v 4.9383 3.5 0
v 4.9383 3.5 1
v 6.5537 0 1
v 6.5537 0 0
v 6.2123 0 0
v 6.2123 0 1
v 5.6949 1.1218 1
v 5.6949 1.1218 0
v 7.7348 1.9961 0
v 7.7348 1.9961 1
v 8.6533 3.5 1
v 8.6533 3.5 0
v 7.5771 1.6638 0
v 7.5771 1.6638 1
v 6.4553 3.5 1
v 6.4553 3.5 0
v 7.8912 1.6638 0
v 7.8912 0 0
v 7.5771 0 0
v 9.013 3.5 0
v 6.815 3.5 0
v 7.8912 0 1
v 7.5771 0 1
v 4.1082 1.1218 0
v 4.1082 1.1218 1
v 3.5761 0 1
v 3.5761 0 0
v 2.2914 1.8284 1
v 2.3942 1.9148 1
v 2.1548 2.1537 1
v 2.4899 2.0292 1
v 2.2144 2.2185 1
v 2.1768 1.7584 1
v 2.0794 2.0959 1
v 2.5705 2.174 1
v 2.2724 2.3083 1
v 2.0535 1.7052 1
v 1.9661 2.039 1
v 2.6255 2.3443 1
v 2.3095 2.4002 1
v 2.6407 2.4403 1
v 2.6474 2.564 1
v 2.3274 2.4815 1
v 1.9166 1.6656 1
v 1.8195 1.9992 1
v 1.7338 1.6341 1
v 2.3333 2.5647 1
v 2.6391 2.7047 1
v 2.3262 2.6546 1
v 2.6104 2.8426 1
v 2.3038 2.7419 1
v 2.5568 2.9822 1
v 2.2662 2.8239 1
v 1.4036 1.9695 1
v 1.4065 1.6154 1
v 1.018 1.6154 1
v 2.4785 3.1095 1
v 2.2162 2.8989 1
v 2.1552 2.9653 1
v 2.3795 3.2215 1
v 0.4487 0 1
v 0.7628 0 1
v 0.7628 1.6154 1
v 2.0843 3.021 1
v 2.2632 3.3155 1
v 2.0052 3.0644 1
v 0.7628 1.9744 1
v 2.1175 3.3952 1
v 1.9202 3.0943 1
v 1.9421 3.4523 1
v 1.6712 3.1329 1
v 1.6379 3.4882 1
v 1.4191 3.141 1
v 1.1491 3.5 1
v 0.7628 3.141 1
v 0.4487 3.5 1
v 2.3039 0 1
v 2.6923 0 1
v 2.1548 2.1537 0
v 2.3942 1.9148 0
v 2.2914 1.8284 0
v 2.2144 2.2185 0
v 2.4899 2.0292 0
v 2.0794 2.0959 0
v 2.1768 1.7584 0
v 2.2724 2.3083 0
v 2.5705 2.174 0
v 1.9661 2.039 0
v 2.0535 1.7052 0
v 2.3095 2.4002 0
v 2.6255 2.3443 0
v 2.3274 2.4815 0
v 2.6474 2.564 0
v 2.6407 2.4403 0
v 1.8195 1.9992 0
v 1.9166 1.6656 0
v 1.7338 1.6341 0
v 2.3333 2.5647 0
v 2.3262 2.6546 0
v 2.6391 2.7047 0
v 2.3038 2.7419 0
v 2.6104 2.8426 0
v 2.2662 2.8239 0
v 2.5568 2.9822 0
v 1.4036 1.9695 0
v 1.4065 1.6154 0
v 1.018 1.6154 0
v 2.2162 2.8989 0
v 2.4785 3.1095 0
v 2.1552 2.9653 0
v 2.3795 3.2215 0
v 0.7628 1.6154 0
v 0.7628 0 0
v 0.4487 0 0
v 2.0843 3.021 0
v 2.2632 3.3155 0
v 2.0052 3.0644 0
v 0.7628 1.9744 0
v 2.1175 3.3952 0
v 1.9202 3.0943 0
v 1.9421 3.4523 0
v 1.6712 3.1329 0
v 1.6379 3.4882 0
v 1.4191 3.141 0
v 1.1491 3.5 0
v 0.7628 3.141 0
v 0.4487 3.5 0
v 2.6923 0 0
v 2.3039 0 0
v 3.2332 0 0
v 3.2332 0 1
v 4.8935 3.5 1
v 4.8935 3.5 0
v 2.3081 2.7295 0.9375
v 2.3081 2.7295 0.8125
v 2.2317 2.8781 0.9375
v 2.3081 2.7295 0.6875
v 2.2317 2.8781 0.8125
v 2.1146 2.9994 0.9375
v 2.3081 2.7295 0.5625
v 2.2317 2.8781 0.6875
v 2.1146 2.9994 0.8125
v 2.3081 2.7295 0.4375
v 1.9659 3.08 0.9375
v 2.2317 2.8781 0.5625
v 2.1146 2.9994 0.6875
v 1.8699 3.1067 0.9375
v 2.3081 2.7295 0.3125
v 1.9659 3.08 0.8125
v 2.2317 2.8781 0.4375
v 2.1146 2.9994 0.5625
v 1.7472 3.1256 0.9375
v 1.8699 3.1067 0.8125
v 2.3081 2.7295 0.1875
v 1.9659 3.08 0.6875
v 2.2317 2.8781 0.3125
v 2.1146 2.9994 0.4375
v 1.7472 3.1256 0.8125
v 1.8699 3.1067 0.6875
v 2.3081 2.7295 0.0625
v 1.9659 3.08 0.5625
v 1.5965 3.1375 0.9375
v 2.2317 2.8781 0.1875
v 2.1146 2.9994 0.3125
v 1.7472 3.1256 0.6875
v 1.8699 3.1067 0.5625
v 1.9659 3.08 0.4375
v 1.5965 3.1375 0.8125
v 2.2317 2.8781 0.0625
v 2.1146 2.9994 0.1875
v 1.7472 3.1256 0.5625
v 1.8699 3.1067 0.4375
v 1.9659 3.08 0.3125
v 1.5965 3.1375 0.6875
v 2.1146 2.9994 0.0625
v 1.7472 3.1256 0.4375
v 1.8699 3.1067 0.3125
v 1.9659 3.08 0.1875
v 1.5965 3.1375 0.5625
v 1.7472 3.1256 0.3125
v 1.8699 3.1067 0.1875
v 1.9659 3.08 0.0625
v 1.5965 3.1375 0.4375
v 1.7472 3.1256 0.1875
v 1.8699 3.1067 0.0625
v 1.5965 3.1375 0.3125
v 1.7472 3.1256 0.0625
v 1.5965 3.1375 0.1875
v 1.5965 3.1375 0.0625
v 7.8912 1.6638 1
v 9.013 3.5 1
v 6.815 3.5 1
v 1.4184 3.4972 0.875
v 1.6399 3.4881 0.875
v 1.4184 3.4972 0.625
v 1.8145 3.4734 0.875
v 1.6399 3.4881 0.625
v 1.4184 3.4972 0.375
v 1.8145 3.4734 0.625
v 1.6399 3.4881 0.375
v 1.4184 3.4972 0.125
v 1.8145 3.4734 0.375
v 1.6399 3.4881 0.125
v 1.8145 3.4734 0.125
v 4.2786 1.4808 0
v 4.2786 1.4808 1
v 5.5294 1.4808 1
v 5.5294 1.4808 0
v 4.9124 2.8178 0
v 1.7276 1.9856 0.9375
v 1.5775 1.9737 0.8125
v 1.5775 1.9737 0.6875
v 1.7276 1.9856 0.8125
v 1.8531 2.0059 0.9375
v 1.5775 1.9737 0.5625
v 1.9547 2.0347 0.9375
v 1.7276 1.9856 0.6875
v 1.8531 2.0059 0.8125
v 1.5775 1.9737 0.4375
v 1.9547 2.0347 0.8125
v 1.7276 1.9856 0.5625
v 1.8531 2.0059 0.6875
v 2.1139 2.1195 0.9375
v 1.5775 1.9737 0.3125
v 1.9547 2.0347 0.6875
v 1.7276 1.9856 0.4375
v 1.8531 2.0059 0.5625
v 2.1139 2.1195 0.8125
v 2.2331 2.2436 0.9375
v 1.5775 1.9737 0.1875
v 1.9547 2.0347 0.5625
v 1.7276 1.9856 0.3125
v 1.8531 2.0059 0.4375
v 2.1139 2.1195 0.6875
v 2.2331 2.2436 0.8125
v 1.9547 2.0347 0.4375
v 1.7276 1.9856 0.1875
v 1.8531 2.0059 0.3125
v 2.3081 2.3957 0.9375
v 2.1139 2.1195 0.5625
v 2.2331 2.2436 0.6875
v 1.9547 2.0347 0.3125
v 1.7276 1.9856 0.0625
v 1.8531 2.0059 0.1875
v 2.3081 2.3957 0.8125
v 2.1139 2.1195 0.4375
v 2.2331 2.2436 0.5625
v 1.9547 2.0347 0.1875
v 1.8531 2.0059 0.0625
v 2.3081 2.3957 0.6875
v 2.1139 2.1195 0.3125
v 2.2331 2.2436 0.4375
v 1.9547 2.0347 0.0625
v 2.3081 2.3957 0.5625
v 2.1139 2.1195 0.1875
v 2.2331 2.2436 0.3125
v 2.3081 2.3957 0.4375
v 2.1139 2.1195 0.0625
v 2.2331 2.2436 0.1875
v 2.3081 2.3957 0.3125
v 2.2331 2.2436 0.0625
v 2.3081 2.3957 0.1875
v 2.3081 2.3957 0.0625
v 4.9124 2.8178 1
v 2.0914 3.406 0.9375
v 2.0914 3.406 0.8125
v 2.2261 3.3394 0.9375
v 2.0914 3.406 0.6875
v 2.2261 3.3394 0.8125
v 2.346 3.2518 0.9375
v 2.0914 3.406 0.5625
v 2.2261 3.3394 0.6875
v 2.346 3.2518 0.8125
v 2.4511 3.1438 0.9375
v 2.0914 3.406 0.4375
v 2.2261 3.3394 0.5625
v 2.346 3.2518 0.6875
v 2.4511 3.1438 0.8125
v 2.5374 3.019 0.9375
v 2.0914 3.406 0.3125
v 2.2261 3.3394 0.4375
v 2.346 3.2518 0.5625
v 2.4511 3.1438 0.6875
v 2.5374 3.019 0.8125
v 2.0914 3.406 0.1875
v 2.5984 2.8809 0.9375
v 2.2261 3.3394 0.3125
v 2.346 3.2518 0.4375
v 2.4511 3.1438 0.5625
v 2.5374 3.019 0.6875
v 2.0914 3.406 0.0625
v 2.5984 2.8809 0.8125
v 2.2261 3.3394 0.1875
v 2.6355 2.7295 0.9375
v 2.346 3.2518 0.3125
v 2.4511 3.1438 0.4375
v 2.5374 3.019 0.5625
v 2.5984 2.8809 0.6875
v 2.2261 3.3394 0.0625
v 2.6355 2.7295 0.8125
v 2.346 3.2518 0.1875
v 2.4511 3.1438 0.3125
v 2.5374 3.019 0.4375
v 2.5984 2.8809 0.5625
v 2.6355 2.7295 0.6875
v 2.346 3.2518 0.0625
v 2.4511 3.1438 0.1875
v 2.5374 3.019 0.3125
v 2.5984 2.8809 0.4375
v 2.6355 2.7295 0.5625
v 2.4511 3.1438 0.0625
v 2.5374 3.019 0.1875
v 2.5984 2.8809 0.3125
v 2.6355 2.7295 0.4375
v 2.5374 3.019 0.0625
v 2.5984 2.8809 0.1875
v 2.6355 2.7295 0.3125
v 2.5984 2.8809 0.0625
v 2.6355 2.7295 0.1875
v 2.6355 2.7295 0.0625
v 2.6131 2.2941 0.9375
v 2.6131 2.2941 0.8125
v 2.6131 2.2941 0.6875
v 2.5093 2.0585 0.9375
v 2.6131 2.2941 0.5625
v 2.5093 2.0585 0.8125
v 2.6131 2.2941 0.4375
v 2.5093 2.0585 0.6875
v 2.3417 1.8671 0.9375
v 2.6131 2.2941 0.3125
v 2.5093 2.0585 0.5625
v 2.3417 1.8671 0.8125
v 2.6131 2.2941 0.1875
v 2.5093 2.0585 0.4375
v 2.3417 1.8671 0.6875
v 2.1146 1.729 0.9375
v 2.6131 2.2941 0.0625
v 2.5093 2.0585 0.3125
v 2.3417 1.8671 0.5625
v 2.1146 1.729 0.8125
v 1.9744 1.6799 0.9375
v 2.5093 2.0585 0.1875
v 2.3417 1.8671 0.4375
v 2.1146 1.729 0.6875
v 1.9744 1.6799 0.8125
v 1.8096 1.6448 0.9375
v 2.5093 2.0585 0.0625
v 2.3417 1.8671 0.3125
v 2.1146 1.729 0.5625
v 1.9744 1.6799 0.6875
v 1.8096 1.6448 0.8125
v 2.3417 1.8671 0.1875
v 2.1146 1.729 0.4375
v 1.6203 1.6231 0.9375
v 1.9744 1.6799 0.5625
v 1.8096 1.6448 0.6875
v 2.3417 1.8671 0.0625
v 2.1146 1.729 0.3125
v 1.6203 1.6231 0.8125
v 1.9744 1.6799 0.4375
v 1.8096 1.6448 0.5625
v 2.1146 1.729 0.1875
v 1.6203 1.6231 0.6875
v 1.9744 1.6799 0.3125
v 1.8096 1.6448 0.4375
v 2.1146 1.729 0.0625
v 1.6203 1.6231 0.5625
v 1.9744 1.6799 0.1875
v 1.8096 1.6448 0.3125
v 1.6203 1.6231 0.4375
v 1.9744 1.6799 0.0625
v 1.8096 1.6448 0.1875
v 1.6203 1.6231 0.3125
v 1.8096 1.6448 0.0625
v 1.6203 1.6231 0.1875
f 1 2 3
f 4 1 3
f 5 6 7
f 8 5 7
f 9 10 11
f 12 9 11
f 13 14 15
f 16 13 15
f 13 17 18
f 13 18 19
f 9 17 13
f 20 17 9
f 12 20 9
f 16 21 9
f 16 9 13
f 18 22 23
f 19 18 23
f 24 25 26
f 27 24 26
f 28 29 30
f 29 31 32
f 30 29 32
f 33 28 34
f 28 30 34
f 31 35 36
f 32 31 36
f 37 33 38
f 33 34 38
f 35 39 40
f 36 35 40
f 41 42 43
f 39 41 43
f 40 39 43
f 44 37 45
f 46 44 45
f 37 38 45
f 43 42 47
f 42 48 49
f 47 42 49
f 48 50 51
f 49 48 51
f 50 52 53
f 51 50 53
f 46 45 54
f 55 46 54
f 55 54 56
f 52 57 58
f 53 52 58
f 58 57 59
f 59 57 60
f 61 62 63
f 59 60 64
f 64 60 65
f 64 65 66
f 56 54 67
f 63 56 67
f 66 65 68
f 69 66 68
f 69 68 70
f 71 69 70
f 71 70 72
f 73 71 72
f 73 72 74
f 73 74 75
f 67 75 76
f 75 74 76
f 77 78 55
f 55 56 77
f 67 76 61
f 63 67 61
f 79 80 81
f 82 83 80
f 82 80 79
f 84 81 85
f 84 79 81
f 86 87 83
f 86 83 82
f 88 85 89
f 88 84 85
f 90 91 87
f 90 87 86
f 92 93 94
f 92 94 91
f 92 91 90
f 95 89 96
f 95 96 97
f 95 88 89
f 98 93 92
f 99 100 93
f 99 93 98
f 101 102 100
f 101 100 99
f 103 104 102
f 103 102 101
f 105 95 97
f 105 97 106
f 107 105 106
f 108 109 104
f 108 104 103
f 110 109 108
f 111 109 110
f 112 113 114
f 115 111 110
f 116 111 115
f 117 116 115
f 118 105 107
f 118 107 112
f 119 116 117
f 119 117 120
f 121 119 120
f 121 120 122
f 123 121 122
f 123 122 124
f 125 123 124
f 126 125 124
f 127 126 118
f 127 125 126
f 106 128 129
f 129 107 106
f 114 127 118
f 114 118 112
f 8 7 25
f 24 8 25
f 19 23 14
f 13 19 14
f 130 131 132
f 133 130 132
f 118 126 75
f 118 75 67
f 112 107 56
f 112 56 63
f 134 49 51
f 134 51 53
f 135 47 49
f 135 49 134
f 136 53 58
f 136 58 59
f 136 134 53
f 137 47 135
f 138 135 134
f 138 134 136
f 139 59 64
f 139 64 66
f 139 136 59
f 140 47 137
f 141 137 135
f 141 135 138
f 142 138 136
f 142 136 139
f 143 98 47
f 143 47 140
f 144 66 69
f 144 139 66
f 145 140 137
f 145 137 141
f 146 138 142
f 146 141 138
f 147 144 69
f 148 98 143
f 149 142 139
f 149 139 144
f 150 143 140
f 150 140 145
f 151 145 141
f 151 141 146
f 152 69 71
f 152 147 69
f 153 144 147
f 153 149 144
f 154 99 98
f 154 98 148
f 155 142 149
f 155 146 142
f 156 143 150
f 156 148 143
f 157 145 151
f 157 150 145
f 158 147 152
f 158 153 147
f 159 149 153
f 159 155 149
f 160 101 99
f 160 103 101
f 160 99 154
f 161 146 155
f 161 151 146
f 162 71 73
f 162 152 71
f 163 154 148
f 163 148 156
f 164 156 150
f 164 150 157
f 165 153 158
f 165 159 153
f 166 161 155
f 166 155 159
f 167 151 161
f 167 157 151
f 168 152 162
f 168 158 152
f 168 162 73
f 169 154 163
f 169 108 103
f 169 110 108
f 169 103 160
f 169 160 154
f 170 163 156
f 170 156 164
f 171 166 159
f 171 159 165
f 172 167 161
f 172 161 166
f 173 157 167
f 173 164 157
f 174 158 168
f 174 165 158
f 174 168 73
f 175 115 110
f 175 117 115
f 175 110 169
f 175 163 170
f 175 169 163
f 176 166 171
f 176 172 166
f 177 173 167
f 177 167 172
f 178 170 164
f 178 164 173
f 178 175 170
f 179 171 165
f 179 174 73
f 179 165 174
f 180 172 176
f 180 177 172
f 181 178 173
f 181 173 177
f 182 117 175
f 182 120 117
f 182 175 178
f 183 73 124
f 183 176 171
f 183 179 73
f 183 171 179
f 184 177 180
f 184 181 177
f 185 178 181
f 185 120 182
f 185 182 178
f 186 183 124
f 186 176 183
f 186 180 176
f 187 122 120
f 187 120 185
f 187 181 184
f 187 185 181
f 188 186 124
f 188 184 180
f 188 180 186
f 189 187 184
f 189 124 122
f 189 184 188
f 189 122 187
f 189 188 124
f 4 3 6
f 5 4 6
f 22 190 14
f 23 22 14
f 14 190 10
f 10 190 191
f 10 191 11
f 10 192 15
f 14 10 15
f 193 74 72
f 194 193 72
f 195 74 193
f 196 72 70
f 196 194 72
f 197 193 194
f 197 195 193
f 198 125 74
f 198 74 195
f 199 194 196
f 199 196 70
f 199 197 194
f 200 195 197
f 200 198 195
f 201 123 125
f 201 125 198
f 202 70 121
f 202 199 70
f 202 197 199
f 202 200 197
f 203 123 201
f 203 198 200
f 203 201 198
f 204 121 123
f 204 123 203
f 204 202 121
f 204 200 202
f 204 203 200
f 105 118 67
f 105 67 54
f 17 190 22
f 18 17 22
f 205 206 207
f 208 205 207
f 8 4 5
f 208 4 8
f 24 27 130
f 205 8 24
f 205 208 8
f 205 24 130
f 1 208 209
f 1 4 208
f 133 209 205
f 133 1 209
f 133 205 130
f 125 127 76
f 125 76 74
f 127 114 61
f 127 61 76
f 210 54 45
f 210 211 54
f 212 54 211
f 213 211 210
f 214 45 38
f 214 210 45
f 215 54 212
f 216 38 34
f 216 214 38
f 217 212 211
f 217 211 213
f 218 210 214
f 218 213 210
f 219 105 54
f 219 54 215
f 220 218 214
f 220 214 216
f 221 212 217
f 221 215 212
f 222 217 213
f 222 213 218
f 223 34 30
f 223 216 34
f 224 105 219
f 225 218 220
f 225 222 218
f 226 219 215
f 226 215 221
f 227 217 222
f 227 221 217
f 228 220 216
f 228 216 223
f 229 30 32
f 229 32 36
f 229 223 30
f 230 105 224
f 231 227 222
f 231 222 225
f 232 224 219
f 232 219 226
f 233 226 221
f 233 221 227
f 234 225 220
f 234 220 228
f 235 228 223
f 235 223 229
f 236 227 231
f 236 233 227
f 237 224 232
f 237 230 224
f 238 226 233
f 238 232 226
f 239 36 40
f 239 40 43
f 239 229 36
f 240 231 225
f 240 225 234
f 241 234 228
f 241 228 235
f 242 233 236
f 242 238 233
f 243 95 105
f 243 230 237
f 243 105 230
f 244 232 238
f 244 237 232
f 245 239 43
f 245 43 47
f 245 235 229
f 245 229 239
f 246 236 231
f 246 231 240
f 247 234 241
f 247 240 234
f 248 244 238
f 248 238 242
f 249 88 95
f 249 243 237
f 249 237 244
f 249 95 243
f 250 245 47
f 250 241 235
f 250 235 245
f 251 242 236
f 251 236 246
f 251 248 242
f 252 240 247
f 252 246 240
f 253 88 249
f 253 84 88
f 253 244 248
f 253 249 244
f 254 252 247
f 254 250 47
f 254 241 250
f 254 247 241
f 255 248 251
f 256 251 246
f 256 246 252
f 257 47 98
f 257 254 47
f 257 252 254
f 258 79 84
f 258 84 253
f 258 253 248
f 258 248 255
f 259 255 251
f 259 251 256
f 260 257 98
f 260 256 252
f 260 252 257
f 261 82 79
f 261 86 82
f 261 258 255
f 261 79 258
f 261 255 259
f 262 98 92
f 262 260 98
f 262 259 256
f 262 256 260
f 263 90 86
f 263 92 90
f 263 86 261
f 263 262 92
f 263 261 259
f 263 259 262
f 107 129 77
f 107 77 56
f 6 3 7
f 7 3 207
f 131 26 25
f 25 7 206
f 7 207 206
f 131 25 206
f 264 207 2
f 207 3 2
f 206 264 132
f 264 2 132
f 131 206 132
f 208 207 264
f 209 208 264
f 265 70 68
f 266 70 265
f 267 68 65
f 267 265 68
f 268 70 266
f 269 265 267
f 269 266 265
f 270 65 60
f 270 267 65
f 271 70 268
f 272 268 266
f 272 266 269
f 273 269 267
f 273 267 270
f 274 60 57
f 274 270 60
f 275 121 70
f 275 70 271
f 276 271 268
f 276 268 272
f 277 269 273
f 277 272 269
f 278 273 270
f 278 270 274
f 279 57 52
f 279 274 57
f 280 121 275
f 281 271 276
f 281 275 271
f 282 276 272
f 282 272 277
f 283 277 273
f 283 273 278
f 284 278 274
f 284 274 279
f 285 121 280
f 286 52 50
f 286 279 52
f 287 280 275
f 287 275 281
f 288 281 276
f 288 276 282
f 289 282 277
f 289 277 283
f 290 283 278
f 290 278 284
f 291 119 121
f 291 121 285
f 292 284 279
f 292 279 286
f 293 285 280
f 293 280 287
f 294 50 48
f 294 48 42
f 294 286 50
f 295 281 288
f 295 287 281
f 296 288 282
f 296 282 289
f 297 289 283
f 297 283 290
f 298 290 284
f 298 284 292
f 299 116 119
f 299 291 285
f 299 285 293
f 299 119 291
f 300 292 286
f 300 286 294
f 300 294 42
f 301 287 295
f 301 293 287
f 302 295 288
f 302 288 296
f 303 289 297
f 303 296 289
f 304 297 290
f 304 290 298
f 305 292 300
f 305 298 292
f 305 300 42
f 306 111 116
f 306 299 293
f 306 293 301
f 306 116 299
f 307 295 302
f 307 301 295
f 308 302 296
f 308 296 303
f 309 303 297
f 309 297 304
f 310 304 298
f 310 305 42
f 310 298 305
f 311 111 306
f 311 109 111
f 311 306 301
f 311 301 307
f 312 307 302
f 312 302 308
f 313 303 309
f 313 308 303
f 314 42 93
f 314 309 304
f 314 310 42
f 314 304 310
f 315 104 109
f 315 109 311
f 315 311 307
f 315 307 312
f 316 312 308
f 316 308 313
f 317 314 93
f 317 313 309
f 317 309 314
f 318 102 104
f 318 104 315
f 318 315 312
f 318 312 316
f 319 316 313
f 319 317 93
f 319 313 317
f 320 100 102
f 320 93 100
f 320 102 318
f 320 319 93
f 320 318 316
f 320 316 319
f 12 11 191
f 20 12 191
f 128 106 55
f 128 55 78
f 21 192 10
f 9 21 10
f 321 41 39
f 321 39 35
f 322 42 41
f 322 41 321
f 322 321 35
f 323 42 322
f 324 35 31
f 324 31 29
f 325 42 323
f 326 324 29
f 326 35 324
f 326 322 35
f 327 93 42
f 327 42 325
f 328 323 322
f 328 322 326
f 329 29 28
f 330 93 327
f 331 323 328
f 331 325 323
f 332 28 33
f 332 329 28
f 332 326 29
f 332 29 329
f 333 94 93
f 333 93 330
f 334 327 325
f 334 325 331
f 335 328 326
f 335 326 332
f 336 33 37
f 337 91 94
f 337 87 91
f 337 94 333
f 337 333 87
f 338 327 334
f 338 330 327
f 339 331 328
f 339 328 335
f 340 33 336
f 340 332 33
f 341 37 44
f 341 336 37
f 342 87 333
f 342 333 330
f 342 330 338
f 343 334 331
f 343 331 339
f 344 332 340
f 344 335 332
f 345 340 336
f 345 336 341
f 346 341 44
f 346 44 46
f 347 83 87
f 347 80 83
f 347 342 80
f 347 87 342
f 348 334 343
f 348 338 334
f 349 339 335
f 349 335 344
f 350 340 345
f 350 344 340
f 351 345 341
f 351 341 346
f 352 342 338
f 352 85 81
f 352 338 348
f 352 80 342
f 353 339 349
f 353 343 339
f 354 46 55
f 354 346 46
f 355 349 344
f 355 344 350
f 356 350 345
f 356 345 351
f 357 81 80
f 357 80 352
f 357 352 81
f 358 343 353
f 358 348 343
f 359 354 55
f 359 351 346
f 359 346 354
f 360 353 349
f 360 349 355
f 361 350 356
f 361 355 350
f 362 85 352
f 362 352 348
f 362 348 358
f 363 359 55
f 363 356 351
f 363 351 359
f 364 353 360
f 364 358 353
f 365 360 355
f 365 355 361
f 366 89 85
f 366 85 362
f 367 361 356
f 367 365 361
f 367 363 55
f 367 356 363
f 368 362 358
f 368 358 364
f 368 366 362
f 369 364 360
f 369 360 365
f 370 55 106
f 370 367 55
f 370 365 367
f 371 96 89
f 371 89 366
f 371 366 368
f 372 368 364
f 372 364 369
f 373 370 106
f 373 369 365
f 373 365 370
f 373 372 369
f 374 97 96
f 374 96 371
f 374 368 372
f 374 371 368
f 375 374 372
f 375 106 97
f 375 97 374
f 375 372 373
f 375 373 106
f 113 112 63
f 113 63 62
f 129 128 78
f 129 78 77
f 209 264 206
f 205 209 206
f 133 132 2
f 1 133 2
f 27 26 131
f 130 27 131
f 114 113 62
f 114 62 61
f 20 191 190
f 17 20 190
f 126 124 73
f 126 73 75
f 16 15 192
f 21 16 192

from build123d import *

# Parameters (mm, degrees)
BOSS_EXTRUDE1_DEPTH   = 1
BOSS_EXTRUDE2_DEPTH   = 1
BOSS_EXTRUDE2_2_DEPTH = 1


with BuildPart() as part:
    # Sketch1 → Boss-Extrude1 (new body)
    with BuildSketch(Plane.XY):
        with BuildLine():
            Line((0.448717949, 3.5), (1.149138622, 3.5))
            add(Edge.make_bspline(
                [(1.149138622, 3.5), (1.19587975, 3.499844414), (1.285627895, 3.499545672), (1.414201165, 3.497879909), (1.531028262, 3.493105553), (1.636048101, 3.48899697), (1.729258756, 3.481505028), (1.810946047, 3.474344381), (1.880733745, 3.46497072), (1.922979596, 3.456265297), (1.942107372, 3.452323718)],
                knots=[0, 0, 0, 0, 1.410062039, 2.707475311, 3.878576406, 4.937260626, 5.877586885, 6.699081471, 7.410979367, 8, 8, 8, 8], degree=3))
            add(Edge.make_bspline(
                [(1.942107372, 3.452323718), (1.967713996, 3.445996953), (2.018380985, 3.433478389), (2.091331051, 3.407018788), (2.160845375, 3.376399163), (2.2266352, 3.340435443), (2.288370991, 3.298860663), (2.346689302, 3.252392541), (2.401854765, 3.201285335), (2.451636395, 3.144250494), (2.498575447, 3.084413984), (2.538164073, 3.019710227), (2.572290553, 2.9520487), (2.59946107, 2.880741282), (2.621339044, 2.80647951), (2.636765283, 2.728590713), (2.646016471, 2.647429738), (2.646958326, 2.59207183), (2.647435897, 2.564002404)],
                knots=[0, 0, 0, 0, 1.027469482, 2.033020251, 3.019912614, 3.986113645, 4.951240523, 5.91722682, 6.890402269, 7.87763091, 8.8651537, 9.85103654, 10.82876324, 11.815024772, 12.821070561, 13.842952187, 14.906261191, 16, 16, 16, 16], degree=3))
            add(Edge.make_bspline(
                [(2.647435897, 2.564002404), (2.645966899, 2.517367299), (2.643100504, 2.426370131), (2.6163754, 2.29430925), (2.57259888, 2.171119935), (2.512275591, 2.056957297), (2.435456115, 1.954046652), (2.343131324, 1.863656197), (2.235249713, 1.788016284), (2.134820397, 1.735563479), (2.046106197, 1.701970571), (1.973072884, 1.678334212), (1.893405907, 1.660072247), (1.807868572, 1.643712115), (1.716104917, 1.63136042), (1.618334877, 1.622313826), (1.514488726, 1.616659777), (1.443149656, 1.615817772), (1.406450321, 1.615384615)],
                knots=[0, 0, 0, 0, 1.260483769, 2.459530307, 3.627416485, 4.787058657, 5.939039949, 7.08810263, 8.267026773, 9.491475466, 10.141966685, 10.831826277, 11.566392101, 12.351337768, 13.187381173, 14.07005841, 15.007169909, 16, 16, 16, 16], degree=3))
            Line((1.406450321, 1.615384615), (2.692307692, 0))
            Line((2.692307692, 0), (2.303886218, 0))
            Line((2.303886218, 0), (1.018028846, 1.615384615))
            Line((1.018028846, 1.615384615), (0.762820513, 1.615384615))
            Line((0.762820513, 1.615384615), (0.762820513, 0))
            Line((0.762820513, 0), (0.448717949, 0))
            Line((0.448717949, 0), (0.448717949, 3.5))
        make_face()
        with BuildLine():
            Line((0.762820513, 3.141025641), (0.762820513, 1.974358974))
            Line((0.762820513, 1.974358974), (1.403645833, 1.969451122))
            add(Edge.make_bspline(
                [(1.403645833, 1.969451122), (1.433565872, 1.969437885), (1.491559429, 1.969412229), (1.575460094, 1.973406005), (1.653580206, 1.977949323), (1.725620958, 1.984898669), (1.791614533, 1.99385474), (1.851527947, 2.005057725), (1.905458998, 2.018109787), (1.968357537, 2.038311413), (2.038594068, 2.070317431), (2.114925528, 2.11688293), (2.179927866, 2.175452049), (2.234845728, 2.242425505), (2.27897516, 2.316061754), (2.310087214, 2.395478123), (2.329829656, 2.478669721), (2.332158202, 2.535847829), (2.333333333, 2.564703526)],
                knots=[0, 0, 0, 0, 1.146690395, 2.22261258, 3.21895312, 4.145990853, 4.996080663, 5.770904154, 6.481378293, 7.121626537, 8.300444488, 9.431385265, 10.535395872, 11.636531494, 12.74115979, 13.810798291, 14.895190096, 16, 16, 16, 16], degree=3))
            add(Edge.make_bspline(
                [(2.333333333, 2.564703526), (2.332131212, 2.592850099), (2.329749047, 2.648626338), (2.310300278, 2.730282248), (2.277410897, 2.807349198), (2.233088659, 2.879513683), (2.179089504, 2.945019419), (2.115771691, 3.001066572), (2.044866496, 3.047316037), (1.978595298, 3.076870418), (1.919361085, 3.094990271), (1.867931425, 3.107741435), (1.809819948, 3.117985904), (1.744744489, 3.126193964), (1.672982858, 3.133248909), (1.594172207, 3.138000687), (1.508835427, 3.140814551), (1.449688496, 3.14095364), (1.419070513, 3.141025641)],
                knots=[0, 0, 0, 0, 1.101028733, 2.181837193, 3.264309656, 4.369019818, 5.486613113, 6.575447106, 7.666700264, 8.788928104, 9.402425223, 10.0903467, 10.862060571, 11.710948788, 12.657782767, 13.684531032, 14.801375019, 16, 16, 16, 16], degree=3))
            Line((1.419070513, 3.141025641), (0.762820513, 3.141025641))
        make_face(mode=Mode.SUBTRACT)
    extrude(amount=BOSS_EXTRUDE1_DEPTH)


with BuildPart() as body_2:
    # Sketch2 → Boss-Extrude2 (new body)
    with BuildSketch(Plane.XY.offset(1)):
        Polygon((4.938349978, 3.5), (6.553734594, 0), (6.21228828, 0), (5.694860395, 1.121794872), (4.108221773, 1.121794872), (3.576070331, 0), (3.233221773, 0), (4.893478184, 3.5), align=None)
        Polygon((4.912408472, 2.817808494), (4.278594369, 1.480769231), (5.529395651, 1.480769231), align=None, mode=Mode.SUBTRACT)
    extrude(amount=-BOSS_EXTRUDE2_DEPTH)


with BuildPart() as body_3:
    # Sketch2 → Boss-Extrude2 2 (new body)
    with BuildSketch(Plane.XY.offset(1)):
        Polygon((6.455275722, 3.5), (6.814951202, 3.5), (7.734822997, 1.99609375), (8.653292549, 3.5), (9.012968029, 3.5), (7.891173158, 1.663762019), (7.891173158, 0), (7.577070593, 0), (7.577070593, 1.663762019), align=None)
    extrude(amount=-BOSS_EXTRUDE2_2_DEPTH)


solid = Compound([part.part, body_2.part, body_3.part])
